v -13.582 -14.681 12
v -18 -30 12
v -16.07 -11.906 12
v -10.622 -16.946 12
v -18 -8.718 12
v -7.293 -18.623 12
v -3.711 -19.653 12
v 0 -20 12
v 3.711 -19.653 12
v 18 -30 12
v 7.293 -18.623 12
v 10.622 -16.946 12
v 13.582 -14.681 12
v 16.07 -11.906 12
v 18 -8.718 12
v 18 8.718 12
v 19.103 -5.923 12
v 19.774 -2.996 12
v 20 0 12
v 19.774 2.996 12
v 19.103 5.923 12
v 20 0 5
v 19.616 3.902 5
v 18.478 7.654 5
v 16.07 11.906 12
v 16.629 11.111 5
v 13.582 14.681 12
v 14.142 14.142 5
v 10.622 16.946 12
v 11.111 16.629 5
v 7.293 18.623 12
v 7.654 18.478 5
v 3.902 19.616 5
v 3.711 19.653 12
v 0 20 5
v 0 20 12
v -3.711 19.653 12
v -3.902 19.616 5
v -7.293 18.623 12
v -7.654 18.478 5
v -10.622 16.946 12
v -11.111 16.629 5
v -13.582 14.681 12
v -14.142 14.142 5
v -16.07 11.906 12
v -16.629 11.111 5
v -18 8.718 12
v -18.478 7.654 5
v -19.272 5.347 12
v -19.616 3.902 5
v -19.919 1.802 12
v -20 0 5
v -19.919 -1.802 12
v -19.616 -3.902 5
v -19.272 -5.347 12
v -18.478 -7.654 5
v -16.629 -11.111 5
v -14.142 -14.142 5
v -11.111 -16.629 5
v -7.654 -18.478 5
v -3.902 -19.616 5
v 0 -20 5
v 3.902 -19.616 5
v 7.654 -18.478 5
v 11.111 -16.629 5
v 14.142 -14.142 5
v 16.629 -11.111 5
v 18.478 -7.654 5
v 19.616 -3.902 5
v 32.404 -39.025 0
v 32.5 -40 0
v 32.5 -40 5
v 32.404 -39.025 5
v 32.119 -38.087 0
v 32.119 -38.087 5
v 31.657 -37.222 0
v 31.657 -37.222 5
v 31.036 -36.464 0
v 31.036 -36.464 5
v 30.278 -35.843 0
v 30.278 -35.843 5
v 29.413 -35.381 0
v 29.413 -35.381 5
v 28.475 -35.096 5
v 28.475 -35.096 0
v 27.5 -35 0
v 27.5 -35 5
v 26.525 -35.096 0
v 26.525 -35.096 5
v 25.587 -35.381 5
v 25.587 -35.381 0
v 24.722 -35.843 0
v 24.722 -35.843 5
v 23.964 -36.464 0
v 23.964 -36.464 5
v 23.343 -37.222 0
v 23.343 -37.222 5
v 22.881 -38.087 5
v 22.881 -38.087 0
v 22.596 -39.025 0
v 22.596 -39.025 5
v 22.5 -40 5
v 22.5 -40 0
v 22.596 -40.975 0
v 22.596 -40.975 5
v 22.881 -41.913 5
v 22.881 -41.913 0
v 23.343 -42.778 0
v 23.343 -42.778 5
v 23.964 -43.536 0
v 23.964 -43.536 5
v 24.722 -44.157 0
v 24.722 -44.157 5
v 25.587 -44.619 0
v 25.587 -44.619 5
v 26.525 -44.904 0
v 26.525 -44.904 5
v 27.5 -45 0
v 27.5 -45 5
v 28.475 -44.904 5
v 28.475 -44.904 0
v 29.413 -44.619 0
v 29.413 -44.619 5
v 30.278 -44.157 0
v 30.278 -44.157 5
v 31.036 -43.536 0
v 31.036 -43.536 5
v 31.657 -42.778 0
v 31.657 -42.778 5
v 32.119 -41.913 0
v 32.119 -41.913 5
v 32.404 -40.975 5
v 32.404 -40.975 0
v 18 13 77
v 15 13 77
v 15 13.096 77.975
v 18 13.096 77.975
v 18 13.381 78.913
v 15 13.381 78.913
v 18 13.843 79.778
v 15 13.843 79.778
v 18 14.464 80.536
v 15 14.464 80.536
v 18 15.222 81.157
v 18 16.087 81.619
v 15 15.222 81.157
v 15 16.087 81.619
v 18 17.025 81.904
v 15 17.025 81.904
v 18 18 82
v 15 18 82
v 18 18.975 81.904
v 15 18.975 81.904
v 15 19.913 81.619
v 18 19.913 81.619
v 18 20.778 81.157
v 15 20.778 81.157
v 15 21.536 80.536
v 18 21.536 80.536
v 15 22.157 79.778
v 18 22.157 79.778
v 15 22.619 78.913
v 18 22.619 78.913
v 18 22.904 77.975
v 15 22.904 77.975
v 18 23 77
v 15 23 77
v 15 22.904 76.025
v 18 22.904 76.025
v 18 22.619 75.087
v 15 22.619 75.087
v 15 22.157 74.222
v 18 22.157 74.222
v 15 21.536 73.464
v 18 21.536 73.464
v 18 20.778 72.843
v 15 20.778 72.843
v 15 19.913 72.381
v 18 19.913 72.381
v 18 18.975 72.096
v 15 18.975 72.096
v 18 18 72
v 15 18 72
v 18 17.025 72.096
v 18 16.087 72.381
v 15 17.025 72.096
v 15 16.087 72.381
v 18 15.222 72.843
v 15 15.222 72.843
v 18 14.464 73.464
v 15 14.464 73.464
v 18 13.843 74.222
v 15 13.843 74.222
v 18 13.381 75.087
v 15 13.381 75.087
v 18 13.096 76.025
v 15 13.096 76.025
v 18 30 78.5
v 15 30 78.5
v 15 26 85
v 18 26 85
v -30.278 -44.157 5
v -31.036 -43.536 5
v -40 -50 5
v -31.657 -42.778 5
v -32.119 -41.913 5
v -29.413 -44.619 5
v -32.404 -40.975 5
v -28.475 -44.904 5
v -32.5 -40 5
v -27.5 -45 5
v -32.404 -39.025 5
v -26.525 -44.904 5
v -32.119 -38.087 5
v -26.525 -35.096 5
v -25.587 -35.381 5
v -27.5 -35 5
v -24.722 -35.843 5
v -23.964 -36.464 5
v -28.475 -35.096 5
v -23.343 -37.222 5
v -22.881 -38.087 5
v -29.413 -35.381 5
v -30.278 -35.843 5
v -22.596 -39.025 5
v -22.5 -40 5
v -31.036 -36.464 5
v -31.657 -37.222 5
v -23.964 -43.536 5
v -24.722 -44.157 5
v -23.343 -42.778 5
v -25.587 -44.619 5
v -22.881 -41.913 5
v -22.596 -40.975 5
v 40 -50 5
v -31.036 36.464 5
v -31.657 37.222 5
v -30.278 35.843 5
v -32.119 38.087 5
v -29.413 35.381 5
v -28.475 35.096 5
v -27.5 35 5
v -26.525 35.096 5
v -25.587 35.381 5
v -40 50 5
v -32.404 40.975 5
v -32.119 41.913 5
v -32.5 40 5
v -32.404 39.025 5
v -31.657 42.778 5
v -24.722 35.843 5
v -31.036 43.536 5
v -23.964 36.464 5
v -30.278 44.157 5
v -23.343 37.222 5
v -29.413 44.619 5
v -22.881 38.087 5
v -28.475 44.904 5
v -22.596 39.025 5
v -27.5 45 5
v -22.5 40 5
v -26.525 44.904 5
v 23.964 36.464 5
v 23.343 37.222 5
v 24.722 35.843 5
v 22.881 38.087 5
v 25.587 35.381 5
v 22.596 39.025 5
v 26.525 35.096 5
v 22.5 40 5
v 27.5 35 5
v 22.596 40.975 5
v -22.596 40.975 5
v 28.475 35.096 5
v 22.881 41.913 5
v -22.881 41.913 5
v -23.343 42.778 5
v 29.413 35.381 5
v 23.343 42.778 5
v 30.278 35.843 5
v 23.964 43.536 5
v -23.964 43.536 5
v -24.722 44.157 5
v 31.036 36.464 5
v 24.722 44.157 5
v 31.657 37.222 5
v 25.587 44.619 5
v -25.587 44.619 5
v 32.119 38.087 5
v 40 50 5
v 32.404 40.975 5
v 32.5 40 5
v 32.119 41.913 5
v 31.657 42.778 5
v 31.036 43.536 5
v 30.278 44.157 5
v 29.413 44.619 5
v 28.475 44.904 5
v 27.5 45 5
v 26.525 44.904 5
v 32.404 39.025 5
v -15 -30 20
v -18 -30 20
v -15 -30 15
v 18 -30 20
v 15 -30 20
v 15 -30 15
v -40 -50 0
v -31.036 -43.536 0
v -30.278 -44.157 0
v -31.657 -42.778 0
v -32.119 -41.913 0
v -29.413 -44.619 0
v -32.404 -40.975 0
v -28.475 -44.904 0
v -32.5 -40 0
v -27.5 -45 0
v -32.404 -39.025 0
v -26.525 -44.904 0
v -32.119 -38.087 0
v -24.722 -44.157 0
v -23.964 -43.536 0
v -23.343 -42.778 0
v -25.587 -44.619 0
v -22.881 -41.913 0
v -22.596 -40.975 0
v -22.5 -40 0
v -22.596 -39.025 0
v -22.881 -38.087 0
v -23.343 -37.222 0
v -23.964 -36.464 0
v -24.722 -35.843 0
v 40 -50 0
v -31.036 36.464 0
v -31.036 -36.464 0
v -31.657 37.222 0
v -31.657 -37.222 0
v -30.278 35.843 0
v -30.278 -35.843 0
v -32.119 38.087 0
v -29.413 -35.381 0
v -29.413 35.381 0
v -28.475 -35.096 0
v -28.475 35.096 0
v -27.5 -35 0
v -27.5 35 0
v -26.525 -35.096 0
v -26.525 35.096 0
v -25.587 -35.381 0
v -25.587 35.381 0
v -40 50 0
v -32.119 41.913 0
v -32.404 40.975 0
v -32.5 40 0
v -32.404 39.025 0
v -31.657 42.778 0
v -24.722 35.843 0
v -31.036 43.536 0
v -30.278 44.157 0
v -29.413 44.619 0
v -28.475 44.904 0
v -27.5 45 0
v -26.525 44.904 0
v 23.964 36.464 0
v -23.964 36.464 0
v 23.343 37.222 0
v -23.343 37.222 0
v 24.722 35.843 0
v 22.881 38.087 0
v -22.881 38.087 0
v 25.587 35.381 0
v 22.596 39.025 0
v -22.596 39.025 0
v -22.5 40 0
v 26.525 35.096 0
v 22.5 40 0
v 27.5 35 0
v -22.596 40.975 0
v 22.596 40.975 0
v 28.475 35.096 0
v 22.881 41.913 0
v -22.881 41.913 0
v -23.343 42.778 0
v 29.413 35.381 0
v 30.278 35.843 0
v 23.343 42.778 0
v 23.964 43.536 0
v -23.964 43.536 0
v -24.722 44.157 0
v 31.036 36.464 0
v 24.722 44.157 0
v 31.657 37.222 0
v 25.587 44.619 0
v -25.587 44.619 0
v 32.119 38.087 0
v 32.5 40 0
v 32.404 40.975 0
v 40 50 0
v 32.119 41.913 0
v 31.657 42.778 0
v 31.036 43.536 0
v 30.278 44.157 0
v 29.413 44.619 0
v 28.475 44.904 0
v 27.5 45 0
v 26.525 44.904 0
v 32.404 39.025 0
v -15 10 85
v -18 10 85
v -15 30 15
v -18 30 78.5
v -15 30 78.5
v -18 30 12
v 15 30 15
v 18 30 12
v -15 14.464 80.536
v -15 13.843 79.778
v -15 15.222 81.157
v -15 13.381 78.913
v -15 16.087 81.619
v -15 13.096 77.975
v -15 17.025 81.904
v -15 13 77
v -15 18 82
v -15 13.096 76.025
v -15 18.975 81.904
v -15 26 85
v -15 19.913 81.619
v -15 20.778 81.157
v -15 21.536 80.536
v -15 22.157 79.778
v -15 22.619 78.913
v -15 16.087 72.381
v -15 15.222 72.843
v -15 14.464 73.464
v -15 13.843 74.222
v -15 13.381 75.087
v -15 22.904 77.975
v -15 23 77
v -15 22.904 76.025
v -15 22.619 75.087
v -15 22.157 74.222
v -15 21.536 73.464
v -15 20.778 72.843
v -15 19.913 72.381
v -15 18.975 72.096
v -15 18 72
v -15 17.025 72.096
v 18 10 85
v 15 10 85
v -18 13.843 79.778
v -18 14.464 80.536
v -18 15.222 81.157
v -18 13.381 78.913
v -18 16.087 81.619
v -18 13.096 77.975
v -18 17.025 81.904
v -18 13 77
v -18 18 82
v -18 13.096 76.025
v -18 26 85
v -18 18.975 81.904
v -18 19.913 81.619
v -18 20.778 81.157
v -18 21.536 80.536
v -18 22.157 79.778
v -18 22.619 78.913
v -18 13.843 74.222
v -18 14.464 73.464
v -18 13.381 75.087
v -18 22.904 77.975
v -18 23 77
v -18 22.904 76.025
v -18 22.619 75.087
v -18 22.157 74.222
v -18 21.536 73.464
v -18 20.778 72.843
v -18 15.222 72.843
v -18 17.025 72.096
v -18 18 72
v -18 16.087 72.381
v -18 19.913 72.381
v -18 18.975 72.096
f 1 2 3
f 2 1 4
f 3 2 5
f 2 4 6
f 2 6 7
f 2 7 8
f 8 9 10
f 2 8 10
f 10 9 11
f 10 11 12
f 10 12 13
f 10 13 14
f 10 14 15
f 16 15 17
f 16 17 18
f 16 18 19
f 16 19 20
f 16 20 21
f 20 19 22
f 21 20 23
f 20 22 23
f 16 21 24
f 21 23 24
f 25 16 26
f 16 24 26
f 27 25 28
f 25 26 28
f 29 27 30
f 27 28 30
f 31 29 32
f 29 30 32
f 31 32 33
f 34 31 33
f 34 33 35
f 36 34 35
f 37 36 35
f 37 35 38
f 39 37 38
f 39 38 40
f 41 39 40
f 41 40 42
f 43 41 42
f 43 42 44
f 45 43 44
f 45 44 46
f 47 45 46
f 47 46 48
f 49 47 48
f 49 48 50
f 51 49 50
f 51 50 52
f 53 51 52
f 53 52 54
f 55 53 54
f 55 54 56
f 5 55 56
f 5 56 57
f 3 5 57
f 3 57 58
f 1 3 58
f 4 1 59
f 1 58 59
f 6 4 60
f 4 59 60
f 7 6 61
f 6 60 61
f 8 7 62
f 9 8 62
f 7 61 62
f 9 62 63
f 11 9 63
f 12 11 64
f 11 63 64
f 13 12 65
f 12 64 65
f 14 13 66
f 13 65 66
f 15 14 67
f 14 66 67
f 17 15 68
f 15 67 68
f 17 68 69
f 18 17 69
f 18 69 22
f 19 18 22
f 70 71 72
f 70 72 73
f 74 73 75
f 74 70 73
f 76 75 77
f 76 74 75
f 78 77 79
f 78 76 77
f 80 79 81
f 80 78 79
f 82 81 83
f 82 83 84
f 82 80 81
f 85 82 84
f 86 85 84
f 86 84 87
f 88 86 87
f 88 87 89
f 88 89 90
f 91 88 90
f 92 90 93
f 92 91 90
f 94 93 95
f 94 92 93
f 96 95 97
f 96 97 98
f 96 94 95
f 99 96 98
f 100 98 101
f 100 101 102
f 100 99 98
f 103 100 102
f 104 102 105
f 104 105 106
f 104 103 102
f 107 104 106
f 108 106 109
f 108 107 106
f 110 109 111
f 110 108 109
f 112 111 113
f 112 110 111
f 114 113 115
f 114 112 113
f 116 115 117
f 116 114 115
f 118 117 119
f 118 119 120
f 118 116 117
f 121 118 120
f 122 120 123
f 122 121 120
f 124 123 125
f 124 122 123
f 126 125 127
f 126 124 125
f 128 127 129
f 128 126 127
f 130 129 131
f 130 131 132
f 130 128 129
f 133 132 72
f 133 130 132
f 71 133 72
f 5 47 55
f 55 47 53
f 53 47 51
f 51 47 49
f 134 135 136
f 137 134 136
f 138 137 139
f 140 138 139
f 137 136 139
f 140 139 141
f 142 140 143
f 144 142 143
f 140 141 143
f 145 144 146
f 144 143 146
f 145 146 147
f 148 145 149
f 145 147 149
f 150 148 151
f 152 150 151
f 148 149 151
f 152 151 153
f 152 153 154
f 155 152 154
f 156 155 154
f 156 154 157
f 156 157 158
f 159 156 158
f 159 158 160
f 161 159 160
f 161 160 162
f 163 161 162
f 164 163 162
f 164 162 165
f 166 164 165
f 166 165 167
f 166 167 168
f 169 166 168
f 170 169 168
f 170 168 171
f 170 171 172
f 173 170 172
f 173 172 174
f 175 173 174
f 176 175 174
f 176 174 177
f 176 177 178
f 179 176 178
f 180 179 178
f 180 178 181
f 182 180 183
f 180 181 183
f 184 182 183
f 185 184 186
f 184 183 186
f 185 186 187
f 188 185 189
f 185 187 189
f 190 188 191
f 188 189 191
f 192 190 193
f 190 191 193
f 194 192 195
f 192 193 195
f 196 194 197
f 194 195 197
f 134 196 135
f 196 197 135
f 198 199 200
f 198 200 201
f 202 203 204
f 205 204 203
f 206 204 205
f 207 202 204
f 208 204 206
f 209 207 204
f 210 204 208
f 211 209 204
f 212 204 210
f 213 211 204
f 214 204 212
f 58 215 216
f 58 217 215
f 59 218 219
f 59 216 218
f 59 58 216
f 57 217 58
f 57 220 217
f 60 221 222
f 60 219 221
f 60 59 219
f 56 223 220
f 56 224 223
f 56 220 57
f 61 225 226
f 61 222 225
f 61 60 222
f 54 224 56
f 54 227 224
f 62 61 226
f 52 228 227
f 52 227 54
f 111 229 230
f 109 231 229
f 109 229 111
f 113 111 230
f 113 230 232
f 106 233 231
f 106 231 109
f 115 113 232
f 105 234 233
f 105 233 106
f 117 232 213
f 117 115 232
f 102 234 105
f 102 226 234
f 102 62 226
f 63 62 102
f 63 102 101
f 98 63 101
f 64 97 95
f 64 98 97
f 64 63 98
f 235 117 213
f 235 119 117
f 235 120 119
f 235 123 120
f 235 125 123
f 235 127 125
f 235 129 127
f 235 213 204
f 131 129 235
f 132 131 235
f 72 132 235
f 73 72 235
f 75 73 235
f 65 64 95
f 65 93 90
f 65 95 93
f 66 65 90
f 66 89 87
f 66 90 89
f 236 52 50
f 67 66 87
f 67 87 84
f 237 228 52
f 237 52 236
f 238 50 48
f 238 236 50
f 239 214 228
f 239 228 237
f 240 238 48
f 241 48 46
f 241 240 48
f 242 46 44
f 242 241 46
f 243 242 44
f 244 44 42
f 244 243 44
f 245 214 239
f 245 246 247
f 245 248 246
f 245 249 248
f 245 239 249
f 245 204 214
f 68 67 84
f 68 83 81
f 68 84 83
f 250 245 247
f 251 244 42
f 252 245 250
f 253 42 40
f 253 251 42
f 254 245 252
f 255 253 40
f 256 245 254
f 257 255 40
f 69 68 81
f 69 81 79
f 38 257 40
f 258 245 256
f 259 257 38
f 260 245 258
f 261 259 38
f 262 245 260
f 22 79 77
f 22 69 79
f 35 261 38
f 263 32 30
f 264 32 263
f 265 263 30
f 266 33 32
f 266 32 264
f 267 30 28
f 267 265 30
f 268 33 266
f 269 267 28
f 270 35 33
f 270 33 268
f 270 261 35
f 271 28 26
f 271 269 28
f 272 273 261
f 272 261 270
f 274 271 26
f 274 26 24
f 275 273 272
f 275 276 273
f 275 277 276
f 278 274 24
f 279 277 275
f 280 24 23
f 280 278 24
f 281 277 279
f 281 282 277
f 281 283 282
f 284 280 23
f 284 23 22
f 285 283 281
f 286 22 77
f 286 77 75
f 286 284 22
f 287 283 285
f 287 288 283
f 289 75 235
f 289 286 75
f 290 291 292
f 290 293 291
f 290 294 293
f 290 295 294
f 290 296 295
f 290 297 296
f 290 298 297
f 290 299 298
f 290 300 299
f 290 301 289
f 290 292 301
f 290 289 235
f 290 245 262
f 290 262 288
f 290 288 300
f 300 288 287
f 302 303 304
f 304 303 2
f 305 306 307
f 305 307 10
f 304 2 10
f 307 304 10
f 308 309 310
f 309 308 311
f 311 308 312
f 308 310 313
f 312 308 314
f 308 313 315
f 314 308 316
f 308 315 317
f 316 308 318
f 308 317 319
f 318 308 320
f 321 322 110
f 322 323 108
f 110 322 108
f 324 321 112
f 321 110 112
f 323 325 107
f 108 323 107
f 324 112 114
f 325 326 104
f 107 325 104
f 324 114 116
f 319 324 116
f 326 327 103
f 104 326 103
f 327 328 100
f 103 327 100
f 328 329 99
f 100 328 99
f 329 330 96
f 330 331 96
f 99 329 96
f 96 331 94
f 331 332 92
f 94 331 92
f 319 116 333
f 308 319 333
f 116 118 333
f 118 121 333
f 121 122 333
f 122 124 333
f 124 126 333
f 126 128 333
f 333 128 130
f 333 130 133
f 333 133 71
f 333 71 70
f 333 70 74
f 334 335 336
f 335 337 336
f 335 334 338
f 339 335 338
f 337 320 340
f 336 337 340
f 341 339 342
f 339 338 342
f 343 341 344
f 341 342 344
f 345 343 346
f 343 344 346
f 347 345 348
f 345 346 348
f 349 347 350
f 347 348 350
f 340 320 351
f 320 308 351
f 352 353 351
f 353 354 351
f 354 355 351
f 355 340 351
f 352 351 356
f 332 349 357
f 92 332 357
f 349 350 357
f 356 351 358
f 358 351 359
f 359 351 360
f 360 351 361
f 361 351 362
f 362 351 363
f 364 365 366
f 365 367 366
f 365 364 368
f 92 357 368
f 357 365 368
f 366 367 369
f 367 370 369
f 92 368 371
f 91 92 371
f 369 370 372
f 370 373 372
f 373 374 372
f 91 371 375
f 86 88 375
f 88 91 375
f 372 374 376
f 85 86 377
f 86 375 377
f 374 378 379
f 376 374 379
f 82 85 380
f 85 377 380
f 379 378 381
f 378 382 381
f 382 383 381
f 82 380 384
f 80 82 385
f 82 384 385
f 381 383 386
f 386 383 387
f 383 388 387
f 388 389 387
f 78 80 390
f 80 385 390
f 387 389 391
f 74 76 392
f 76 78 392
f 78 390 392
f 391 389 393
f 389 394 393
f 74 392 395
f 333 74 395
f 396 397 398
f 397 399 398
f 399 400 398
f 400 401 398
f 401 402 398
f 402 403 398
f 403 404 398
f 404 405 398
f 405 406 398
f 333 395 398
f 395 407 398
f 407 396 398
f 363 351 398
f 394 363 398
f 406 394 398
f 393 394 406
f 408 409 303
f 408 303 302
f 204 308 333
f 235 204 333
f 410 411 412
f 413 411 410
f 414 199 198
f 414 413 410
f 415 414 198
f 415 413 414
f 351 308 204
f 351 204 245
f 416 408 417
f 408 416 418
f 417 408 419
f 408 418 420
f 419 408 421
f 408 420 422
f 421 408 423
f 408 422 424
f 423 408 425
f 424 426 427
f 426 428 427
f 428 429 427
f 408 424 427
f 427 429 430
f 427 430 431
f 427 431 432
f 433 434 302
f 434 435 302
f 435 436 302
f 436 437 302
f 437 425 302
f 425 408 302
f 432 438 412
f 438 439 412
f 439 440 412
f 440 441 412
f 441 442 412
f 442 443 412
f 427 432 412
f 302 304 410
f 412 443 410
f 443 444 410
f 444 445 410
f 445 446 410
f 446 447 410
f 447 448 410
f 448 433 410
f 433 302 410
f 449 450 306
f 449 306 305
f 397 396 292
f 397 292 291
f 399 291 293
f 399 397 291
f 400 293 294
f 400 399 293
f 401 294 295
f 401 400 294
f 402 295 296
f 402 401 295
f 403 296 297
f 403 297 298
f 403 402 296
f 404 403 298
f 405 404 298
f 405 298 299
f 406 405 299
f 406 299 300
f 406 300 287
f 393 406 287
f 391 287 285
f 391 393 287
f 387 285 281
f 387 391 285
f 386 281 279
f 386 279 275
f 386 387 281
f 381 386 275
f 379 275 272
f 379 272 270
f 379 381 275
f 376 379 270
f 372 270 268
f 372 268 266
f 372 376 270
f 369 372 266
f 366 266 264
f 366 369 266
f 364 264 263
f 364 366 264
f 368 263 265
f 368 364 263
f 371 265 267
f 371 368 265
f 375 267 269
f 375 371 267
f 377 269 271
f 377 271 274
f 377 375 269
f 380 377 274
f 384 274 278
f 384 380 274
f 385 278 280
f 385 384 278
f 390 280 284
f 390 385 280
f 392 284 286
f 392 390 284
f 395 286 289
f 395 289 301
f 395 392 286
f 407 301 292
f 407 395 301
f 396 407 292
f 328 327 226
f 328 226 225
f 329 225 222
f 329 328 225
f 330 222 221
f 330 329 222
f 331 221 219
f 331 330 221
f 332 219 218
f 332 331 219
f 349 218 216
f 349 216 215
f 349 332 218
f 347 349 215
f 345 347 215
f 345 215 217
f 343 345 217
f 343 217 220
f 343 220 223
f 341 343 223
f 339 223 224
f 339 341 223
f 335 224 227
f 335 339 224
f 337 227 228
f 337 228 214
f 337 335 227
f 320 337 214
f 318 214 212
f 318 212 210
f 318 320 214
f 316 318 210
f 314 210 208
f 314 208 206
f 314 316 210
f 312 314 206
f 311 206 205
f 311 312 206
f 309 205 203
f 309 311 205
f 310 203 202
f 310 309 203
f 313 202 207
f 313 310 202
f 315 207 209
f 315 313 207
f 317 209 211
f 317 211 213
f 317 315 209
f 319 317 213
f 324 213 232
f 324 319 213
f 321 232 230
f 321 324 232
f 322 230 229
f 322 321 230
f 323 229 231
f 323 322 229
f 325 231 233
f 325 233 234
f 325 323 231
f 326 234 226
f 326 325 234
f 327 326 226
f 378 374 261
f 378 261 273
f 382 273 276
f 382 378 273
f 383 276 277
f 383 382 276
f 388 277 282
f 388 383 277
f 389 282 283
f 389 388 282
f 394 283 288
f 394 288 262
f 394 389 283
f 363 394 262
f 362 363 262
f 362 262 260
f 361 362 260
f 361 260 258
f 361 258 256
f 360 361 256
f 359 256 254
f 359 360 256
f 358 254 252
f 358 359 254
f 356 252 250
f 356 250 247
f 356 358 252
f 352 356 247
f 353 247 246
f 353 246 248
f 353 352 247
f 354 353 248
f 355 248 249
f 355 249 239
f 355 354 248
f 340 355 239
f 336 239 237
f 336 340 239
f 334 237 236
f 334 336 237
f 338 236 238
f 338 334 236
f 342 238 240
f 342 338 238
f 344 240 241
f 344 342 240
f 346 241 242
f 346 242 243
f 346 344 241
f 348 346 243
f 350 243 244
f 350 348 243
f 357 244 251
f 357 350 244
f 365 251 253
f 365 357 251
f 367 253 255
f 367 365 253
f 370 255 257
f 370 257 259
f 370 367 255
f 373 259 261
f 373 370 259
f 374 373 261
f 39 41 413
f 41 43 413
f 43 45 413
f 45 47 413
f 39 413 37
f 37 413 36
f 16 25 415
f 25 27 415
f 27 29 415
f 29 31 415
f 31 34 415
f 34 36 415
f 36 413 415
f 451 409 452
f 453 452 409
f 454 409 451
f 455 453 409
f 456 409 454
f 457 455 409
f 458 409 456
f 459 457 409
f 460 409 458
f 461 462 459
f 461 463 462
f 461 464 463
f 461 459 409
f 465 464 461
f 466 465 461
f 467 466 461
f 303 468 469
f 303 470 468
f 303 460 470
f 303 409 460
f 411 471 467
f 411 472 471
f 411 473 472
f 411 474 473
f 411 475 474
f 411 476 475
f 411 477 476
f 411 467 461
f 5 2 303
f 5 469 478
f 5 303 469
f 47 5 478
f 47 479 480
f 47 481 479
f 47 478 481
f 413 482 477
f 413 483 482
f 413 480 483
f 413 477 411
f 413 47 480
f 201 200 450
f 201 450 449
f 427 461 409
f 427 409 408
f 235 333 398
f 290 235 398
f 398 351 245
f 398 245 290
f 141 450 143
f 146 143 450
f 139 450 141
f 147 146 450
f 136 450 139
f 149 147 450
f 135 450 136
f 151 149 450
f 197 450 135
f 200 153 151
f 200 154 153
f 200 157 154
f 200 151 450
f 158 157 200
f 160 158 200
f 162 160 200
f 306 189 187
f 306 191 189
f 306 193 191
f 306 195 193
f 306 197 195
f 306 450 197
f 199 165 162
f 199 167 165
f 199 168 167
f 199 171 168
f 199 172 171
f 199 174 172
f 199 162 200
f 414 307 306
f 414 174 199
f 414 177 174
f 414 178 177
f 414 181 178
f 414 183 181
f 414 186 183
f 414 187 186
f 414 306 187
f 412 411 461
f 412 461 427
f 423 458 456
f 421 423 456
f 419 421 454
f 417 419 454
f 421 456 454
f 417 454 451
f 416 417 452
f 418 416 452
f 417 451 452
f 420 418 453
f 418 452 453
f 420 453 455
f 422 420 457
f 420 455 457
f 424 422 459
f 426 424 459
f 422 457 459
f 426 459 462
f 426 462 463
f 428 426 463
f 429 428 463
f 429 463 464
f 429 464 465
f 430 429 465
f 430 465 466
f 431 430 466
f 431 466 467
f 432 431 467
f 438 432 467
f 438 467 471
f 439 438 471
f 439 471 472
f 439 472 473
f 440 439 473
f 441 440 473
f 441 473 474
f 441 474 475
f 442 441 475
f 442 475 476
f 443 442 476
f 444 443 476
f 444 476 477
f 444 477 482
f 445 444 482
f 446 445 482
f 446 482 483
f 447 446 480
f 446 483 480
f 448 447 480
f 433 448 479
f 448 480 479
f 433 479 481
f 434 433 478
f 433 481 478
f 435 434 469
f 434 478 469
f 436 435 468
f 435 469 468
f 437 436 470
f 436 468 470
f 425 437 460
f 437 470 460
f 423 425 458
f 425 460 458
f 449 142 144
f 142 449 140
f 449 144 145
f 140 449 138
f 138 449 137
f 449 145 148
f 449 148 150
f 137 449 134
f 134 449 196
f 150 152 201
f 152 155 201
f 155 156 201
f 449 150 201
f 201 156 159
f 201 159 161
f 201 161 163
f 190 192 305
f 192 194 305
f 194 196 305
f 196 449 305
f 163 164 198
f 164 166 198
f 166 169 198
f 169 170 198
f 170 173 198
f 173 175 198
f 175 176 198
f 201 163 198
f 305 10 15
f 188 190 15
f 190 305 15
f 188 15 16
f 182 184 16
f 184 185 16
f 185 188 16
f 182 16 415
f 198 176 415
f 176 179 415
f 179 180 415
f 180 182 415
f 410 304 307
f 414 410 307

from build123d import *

# Parameters (mm, degrees)
F0_W       = 80
F0_H       = 100
F0_R       = 5
F0_R_2     = 20
F1_DEPTH   = 5
F2_DEPTH   = 12
F4_DEPTH   = 3
F5_W       = 3
F5_H       = 60
F6_DEPTH   = 70
F7_SIZE2   = 40
F7_SIZE    = 65
F8_SIZE2   = 6.5
F8_SIZE    = 4
F8_2_SIZE2 = 6.5
F8_2_SIZE  = 4
F9_R       = 5
F10_DEPTH  = 60


with BuildPart() as f1:
    # F0 (on Top) → F1 (new body)
    with BuildSketch(Plane.XY):
        Rectangle(F0_W, F0_H)
        with Locations((-27.5, -40)):
            Circle(F0_R, mode=Mode.SUBTRACT)
        with Locations((27.5, -40)):
            Circle(F0_R, mode=Mode.SUBTRACT)
        with Locations((-27.5, 40)):
            Circle(F0_R, mode=Mode.SUBTRACT)
        Circle(F0_R_2, mode=Mode.SUBTRACT)
        with Locations((27.5, 40)):
            Circle(F0_R, mode=Mode.SUBTRACT)
        Circle(F0_R_2)
    extrude(amount=F1_DEPTH)

    # F0 (on Top) → F2 (join)
    with BuildSketch(Plane.XY):
        Circle(F0_R_2)
    extrude(amount=F2_DEPTH)

    # F3 (on face) → F4 (join)
    with BuildSketch(Plane.XY.offset(12)):
        with BuildLine():
            Line((-18, -30), (18, -30))
            Line((18, -30), (18, -8.7177978871))
            ThreePointArc((18, -8.7177978871), (0, -20), (-18, -8.7177978871))
            Line((-18, -8.7177978871), (-18, -30))
        make_face()
        with BuildLine():
            ThreePointArc((-18, -8.7177978871), (0, -20), (18, -8.7177978871))
            Line((18, -8.7177978871), (18, 8.7177978871))
            ThreePointArc((18, 8.7177978871), (0, 20), (-18, 8.7177978871))
            Line((-18, 8.7177978871), (-18, -8.7177978871))
        make_face()
        with BuildLine():
            ThreePointArc((-18, 8.7177978871), (0, 20), (18, 8.7177978871))
            Line((18, 8.7177978871), (18, 30))
            Line((18, 30), (-18, 30))
            Line((-18, 30), (-18, 8.7177978871))
        make_face()
    extrude(amount=F4_DEPTH)

    # F5 (on face) → F6 (join)
    with BuildSketch(Plane.XY.offset(15)):
        with Locations((-16.5, 0)):
            Rectangle(F5_W, F5_H)
        with Locations((16.5, 0)):
            Rectangle(F5_W, F5_H)
    extrude(amount=F6_DEPTH)

    # F7
    f7_edges = [f1.edges().sort_by_distance(p)[0] for p in [
        (16.5, -30, 85),
        (-16.5, -30, 85),
    ]]
    f7_side = f1.faces().sort_by_distance((-17.186059, -30, 48.5))[0]
    chamfer(f7_edges, length=F7_SIZE, length2=F7_SIZE2, reference=f7_side)

    # F8
    f8_edges = [f1.edges().sort_by_distance(p)[0] for p in [
        (16.5, 30, 85),
    ]]
    f8_side = f1.faces().sort_by_distance((16.5, 20, 85))[0]
    chamfer(f8_edges, length=F8_SIZE, length2=F8_SIZE2, reference=f8_side)

    # F8#2
    f8_2_edges = [f1.edges().sort_by_distance(p)[0] for p in [
        (-16.5, 30, 85),
    ]]
    f8_2_side = f1.faces().sort_by_distance((-16.5, 20, 85))[0]
    chamfer(f8_2_edges, length=F8_2_SIZE, length2=F8_2_SIZE2, reference=f8_2_side)

    # F9 (on face) → F10 (cut)
    with BuildSketch(Plane(origin=(-18, 0, 0), x_dir=(0, -1, 0), z_dir=(-1, 0, 0))):
        with Locations((-18, 77)):
            Circle(F9_R)
    extrude(amount=-F10_DEPTH, mode=Mode.SUBTRACT)


solid = f1.part
